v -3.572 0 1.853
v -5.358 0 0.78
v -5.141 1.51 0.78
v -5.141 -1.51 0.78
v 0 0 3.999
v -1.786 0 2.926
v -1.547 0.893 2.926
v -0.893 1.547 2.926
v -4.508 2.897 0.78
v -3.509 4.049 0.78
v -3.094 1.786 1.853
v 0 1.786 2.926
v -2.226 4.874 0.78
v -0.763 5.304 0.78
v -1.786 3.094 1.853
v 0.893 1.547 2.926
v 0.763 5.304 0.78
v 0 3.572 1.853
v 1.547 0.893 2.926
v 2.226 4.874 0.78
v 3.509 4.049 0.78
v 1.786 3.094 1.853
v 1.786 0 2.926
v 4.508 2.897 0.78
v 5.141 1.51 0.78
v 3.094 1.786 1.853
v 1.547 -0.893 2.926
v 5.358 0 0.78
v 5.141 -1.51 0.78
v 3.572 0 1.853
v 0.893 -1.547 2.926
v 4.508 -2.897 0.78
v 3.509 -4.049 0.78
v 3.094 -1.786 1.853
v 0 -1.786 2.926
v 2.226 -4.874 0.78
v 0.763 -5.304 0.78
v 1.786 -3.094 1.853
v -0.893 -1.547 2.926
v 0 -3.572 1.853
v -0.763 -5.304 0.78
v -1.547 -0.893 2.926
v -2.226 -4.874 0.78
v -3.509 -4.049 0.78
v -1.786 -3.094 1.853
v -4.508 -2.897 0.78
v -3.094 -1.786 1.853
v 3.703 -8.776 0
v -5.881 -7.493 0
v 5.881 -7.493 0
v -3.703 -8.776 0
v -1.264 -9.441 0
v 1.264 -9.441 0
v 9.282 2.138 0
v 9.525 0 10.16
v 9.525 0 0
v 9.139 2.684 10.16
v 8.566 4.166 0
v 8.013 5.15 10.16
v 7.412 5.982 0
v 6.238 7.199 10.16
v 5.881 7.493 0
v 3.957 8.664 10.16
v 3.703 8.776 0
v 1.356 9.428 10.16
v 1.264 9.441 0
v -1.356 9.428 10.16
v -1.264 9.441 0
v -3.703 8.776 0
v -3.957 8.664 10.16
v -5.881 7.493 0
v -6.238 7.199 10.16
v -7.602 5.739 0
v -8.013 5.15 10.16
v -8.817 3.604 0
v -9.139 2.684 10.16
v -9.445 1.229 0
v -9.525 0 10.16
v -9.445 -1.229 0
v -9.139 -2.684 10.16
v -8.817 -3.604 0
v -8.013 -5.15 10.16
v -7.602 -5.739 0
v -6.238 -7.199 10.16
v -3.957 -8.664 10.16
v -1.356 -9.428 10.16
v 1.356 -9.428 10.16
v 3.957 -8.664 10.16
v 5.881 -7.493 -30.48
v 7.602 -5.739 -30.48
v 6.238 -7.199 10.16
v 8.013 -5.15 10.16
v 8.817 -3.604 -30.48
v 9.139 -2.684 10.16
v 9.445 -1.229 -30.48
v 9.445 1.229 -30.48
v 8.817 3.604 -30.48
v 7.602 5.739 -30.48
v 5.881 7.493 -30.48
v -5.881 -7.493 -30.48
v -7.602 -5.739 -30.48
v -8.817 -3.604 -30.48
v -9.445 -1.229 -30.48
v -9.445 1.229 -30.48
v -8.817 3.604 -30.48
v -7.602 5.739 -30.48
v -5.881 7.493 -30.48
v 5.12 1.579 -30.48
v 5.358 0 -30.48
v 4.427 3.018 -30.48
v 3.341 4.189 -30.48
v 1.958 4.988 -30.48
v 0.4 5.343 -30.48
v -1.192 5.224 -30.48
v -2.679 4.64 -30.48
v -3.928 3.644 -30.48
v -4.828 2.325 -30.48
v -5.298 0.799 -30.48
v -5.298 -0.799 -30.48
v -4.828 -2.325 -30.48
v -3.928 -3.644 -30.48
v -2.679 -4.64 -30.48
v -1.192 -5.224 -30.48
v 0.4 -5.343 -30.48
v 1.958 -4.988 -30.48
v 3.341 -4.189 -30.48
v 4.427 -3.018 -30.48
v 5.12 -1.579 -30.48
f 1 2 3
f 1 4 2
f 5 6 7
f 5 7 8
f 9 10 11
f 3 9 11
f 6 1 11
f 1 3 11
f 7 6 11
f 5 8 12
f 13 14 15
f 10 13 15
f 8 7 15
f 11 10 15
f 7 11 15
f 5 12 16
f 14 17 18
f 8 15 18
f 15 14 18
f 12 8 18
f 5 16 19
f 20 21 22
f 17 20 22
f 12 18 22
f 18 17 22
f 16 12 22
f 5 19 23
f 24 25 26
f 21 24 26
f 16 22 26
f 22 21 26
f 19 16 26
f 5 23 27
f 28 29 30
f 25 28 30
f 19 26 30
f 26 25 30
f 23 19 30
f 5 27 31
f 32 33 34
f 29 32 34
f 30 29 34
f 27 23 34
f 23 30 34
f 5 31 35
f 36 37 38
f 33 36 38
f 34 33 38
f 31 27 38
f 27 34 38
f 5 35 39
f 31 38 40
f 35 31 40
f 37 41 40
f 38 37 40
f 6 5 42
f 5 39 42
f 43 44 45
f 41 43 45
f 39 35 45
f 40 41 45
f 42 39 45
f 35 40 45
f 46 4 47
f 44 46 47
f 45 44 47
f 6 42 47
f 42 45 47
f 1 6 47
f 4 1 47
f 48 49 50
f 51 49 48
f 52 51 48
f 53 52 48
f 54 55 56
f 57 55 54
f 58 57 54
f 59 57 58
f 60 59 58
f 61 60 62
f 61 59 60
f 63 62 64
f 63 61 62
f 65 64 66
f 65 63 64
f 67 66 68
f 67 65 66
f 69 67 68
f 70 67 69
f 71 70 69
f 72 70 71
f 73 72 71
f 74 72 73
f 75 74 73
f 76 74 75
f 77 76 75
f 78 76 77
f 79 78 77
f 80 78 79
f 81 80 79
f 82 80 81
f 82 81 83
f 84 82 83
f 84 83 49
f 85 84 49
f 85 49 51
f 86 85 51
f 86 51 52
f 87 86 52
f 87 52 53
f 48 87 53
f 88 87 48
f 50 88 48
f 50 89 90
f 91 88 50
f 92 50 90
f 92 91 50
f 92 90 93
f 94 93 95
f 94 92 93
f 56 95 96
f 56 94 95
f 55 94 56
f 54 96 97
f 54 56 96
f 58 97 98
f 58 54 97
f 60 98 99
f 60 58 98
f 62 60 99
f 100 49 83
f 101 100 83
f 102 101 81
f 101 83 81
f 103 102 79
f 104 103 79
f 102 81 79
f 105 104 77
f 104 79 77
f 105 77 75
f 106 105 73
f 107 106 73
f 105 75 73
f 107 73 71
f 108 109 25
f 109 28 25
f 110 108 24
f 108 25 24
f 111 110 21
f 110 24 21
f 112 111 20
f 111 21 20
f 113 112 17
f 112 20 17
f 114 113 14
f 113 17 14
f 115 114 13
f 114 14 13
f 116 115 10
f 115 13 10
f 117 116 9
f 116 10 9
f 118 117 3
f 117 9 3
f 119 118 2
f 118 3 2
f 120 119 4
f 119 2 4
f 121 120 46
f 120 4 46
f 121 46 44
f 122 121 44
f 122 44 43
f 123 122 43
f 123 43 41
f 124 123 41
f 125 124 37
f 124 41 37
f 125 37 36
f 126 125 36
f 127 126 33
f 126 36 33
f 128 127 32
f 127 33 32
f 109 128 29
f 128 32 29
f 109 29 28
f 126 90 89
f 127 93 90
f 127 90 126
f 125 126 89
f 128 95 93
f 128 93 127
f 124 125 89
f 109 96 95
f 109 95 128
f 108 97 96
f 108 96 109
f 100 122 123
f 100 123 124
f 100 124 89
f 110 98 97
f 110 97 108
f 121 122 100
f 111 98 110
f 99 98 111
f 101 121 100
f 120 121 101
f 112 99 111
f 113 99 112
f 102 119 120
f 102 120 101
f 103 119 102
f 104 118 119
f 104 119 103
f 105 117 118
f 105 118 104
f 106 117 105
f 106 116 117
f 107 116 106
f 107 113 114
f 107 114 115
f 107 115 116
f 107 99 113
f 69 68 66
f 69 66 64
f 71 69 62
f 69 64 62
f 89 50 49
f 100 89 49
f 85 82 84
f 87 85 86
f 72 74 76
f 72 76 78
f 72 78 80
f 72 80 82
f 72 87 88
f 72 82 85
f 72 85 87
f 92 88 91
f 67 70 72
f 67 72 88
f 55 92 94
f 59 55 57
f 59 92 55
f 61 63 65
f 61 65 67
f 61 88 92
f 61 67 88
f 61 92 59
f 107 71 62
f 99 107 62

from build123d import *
from build123d.topology import SkipClean

# Parameters (mm, degrees)
EXTRUDE1_DEPTH              = 30.48
EXTRUDE2_START              = 25.4
SKETCH2_R                   = 9.525
EXTRUDE2_DEPTH              = 25.4
F_1_2_13_TAPPED_HOLE1_D     = 10.71626
F_1_2_13_TAPPED_HOLE1_DEPTH = 31.25978
F_1_2_13_TAPPED_HOLE1_TIP   = 3.219489309
SKETCH6_R                   = 9.525
CUT_EXTRUDE1_DEPTH          = 15.24


with BuildPart() as part:
    # Sketch1 → Extrude1 (new body)
    with BuildSketch(Plane.XY):
        with BuildLine():
            Line((-5.880525147, 7.493), (5.880525147, 7.493))
            ThreePointArc((5.880525147, 7.493), (9.525, 0), (5.880525147, -7.493))
            Line((5.880525147, -7.493), (-5.880525147, -7.493))
            ThreePointArc((-5.880525147, -7.493), (-9.525, 0), (-5.880525147, 7.493))
        make_face()
    extrude(amount=-EXTRUDE1_DEPTH)

    # Sketch2 → Extrude2 (add)
    with SkipClean():  # the faces are left unmerged after this step: merging them gives an invalid solid
        with BuildSketch(Plane.XY.offset(EXTRUDE2_START)):
            Circle(SKETCH2_R)
        extrude(amount=-EXTRUDE2_DEPTH)

    # 1/2-13 Tapped Hole1
    with Locations(Plane(origin=(0, 0, -30.48), x_dir=(-1, 0, 0), z_dir=(0, 0, -1))):
        with Locations((0, 0)):
            Hole(F_1_2_13_TAPPED_HOLE1_D / 2, depth=F_1_2_13_TAPPED_HOLE1_DEPTH)
            with Locations((0, 0, -(F_1_2_13_TAPPED_HOLE1_DEPTH + F_1_2_13_TAPPED_HOLE1_TIP / 2))):  # 118° drill point
                Cone(0, F_1_2_13_TAPPED_HOLE1_D / 2, F_1_2_13_TAPPED_HOLE1_TIP, mode=Mode.SUBTRACT)

    # Sketch6 → Cut-Extrude1 (cut)
    with SkipClean():  # the faces are left unmerged after this step: merging them gives an invalid solid
        with BuildSketch(Plane.XY.offset(25.4)):
            Circle(SKETCH6_R)
        extrude(amount=-CUT_EXTRUDE1_DEPTH, mode=Mode.SUBTRACT)


solid = part.part
